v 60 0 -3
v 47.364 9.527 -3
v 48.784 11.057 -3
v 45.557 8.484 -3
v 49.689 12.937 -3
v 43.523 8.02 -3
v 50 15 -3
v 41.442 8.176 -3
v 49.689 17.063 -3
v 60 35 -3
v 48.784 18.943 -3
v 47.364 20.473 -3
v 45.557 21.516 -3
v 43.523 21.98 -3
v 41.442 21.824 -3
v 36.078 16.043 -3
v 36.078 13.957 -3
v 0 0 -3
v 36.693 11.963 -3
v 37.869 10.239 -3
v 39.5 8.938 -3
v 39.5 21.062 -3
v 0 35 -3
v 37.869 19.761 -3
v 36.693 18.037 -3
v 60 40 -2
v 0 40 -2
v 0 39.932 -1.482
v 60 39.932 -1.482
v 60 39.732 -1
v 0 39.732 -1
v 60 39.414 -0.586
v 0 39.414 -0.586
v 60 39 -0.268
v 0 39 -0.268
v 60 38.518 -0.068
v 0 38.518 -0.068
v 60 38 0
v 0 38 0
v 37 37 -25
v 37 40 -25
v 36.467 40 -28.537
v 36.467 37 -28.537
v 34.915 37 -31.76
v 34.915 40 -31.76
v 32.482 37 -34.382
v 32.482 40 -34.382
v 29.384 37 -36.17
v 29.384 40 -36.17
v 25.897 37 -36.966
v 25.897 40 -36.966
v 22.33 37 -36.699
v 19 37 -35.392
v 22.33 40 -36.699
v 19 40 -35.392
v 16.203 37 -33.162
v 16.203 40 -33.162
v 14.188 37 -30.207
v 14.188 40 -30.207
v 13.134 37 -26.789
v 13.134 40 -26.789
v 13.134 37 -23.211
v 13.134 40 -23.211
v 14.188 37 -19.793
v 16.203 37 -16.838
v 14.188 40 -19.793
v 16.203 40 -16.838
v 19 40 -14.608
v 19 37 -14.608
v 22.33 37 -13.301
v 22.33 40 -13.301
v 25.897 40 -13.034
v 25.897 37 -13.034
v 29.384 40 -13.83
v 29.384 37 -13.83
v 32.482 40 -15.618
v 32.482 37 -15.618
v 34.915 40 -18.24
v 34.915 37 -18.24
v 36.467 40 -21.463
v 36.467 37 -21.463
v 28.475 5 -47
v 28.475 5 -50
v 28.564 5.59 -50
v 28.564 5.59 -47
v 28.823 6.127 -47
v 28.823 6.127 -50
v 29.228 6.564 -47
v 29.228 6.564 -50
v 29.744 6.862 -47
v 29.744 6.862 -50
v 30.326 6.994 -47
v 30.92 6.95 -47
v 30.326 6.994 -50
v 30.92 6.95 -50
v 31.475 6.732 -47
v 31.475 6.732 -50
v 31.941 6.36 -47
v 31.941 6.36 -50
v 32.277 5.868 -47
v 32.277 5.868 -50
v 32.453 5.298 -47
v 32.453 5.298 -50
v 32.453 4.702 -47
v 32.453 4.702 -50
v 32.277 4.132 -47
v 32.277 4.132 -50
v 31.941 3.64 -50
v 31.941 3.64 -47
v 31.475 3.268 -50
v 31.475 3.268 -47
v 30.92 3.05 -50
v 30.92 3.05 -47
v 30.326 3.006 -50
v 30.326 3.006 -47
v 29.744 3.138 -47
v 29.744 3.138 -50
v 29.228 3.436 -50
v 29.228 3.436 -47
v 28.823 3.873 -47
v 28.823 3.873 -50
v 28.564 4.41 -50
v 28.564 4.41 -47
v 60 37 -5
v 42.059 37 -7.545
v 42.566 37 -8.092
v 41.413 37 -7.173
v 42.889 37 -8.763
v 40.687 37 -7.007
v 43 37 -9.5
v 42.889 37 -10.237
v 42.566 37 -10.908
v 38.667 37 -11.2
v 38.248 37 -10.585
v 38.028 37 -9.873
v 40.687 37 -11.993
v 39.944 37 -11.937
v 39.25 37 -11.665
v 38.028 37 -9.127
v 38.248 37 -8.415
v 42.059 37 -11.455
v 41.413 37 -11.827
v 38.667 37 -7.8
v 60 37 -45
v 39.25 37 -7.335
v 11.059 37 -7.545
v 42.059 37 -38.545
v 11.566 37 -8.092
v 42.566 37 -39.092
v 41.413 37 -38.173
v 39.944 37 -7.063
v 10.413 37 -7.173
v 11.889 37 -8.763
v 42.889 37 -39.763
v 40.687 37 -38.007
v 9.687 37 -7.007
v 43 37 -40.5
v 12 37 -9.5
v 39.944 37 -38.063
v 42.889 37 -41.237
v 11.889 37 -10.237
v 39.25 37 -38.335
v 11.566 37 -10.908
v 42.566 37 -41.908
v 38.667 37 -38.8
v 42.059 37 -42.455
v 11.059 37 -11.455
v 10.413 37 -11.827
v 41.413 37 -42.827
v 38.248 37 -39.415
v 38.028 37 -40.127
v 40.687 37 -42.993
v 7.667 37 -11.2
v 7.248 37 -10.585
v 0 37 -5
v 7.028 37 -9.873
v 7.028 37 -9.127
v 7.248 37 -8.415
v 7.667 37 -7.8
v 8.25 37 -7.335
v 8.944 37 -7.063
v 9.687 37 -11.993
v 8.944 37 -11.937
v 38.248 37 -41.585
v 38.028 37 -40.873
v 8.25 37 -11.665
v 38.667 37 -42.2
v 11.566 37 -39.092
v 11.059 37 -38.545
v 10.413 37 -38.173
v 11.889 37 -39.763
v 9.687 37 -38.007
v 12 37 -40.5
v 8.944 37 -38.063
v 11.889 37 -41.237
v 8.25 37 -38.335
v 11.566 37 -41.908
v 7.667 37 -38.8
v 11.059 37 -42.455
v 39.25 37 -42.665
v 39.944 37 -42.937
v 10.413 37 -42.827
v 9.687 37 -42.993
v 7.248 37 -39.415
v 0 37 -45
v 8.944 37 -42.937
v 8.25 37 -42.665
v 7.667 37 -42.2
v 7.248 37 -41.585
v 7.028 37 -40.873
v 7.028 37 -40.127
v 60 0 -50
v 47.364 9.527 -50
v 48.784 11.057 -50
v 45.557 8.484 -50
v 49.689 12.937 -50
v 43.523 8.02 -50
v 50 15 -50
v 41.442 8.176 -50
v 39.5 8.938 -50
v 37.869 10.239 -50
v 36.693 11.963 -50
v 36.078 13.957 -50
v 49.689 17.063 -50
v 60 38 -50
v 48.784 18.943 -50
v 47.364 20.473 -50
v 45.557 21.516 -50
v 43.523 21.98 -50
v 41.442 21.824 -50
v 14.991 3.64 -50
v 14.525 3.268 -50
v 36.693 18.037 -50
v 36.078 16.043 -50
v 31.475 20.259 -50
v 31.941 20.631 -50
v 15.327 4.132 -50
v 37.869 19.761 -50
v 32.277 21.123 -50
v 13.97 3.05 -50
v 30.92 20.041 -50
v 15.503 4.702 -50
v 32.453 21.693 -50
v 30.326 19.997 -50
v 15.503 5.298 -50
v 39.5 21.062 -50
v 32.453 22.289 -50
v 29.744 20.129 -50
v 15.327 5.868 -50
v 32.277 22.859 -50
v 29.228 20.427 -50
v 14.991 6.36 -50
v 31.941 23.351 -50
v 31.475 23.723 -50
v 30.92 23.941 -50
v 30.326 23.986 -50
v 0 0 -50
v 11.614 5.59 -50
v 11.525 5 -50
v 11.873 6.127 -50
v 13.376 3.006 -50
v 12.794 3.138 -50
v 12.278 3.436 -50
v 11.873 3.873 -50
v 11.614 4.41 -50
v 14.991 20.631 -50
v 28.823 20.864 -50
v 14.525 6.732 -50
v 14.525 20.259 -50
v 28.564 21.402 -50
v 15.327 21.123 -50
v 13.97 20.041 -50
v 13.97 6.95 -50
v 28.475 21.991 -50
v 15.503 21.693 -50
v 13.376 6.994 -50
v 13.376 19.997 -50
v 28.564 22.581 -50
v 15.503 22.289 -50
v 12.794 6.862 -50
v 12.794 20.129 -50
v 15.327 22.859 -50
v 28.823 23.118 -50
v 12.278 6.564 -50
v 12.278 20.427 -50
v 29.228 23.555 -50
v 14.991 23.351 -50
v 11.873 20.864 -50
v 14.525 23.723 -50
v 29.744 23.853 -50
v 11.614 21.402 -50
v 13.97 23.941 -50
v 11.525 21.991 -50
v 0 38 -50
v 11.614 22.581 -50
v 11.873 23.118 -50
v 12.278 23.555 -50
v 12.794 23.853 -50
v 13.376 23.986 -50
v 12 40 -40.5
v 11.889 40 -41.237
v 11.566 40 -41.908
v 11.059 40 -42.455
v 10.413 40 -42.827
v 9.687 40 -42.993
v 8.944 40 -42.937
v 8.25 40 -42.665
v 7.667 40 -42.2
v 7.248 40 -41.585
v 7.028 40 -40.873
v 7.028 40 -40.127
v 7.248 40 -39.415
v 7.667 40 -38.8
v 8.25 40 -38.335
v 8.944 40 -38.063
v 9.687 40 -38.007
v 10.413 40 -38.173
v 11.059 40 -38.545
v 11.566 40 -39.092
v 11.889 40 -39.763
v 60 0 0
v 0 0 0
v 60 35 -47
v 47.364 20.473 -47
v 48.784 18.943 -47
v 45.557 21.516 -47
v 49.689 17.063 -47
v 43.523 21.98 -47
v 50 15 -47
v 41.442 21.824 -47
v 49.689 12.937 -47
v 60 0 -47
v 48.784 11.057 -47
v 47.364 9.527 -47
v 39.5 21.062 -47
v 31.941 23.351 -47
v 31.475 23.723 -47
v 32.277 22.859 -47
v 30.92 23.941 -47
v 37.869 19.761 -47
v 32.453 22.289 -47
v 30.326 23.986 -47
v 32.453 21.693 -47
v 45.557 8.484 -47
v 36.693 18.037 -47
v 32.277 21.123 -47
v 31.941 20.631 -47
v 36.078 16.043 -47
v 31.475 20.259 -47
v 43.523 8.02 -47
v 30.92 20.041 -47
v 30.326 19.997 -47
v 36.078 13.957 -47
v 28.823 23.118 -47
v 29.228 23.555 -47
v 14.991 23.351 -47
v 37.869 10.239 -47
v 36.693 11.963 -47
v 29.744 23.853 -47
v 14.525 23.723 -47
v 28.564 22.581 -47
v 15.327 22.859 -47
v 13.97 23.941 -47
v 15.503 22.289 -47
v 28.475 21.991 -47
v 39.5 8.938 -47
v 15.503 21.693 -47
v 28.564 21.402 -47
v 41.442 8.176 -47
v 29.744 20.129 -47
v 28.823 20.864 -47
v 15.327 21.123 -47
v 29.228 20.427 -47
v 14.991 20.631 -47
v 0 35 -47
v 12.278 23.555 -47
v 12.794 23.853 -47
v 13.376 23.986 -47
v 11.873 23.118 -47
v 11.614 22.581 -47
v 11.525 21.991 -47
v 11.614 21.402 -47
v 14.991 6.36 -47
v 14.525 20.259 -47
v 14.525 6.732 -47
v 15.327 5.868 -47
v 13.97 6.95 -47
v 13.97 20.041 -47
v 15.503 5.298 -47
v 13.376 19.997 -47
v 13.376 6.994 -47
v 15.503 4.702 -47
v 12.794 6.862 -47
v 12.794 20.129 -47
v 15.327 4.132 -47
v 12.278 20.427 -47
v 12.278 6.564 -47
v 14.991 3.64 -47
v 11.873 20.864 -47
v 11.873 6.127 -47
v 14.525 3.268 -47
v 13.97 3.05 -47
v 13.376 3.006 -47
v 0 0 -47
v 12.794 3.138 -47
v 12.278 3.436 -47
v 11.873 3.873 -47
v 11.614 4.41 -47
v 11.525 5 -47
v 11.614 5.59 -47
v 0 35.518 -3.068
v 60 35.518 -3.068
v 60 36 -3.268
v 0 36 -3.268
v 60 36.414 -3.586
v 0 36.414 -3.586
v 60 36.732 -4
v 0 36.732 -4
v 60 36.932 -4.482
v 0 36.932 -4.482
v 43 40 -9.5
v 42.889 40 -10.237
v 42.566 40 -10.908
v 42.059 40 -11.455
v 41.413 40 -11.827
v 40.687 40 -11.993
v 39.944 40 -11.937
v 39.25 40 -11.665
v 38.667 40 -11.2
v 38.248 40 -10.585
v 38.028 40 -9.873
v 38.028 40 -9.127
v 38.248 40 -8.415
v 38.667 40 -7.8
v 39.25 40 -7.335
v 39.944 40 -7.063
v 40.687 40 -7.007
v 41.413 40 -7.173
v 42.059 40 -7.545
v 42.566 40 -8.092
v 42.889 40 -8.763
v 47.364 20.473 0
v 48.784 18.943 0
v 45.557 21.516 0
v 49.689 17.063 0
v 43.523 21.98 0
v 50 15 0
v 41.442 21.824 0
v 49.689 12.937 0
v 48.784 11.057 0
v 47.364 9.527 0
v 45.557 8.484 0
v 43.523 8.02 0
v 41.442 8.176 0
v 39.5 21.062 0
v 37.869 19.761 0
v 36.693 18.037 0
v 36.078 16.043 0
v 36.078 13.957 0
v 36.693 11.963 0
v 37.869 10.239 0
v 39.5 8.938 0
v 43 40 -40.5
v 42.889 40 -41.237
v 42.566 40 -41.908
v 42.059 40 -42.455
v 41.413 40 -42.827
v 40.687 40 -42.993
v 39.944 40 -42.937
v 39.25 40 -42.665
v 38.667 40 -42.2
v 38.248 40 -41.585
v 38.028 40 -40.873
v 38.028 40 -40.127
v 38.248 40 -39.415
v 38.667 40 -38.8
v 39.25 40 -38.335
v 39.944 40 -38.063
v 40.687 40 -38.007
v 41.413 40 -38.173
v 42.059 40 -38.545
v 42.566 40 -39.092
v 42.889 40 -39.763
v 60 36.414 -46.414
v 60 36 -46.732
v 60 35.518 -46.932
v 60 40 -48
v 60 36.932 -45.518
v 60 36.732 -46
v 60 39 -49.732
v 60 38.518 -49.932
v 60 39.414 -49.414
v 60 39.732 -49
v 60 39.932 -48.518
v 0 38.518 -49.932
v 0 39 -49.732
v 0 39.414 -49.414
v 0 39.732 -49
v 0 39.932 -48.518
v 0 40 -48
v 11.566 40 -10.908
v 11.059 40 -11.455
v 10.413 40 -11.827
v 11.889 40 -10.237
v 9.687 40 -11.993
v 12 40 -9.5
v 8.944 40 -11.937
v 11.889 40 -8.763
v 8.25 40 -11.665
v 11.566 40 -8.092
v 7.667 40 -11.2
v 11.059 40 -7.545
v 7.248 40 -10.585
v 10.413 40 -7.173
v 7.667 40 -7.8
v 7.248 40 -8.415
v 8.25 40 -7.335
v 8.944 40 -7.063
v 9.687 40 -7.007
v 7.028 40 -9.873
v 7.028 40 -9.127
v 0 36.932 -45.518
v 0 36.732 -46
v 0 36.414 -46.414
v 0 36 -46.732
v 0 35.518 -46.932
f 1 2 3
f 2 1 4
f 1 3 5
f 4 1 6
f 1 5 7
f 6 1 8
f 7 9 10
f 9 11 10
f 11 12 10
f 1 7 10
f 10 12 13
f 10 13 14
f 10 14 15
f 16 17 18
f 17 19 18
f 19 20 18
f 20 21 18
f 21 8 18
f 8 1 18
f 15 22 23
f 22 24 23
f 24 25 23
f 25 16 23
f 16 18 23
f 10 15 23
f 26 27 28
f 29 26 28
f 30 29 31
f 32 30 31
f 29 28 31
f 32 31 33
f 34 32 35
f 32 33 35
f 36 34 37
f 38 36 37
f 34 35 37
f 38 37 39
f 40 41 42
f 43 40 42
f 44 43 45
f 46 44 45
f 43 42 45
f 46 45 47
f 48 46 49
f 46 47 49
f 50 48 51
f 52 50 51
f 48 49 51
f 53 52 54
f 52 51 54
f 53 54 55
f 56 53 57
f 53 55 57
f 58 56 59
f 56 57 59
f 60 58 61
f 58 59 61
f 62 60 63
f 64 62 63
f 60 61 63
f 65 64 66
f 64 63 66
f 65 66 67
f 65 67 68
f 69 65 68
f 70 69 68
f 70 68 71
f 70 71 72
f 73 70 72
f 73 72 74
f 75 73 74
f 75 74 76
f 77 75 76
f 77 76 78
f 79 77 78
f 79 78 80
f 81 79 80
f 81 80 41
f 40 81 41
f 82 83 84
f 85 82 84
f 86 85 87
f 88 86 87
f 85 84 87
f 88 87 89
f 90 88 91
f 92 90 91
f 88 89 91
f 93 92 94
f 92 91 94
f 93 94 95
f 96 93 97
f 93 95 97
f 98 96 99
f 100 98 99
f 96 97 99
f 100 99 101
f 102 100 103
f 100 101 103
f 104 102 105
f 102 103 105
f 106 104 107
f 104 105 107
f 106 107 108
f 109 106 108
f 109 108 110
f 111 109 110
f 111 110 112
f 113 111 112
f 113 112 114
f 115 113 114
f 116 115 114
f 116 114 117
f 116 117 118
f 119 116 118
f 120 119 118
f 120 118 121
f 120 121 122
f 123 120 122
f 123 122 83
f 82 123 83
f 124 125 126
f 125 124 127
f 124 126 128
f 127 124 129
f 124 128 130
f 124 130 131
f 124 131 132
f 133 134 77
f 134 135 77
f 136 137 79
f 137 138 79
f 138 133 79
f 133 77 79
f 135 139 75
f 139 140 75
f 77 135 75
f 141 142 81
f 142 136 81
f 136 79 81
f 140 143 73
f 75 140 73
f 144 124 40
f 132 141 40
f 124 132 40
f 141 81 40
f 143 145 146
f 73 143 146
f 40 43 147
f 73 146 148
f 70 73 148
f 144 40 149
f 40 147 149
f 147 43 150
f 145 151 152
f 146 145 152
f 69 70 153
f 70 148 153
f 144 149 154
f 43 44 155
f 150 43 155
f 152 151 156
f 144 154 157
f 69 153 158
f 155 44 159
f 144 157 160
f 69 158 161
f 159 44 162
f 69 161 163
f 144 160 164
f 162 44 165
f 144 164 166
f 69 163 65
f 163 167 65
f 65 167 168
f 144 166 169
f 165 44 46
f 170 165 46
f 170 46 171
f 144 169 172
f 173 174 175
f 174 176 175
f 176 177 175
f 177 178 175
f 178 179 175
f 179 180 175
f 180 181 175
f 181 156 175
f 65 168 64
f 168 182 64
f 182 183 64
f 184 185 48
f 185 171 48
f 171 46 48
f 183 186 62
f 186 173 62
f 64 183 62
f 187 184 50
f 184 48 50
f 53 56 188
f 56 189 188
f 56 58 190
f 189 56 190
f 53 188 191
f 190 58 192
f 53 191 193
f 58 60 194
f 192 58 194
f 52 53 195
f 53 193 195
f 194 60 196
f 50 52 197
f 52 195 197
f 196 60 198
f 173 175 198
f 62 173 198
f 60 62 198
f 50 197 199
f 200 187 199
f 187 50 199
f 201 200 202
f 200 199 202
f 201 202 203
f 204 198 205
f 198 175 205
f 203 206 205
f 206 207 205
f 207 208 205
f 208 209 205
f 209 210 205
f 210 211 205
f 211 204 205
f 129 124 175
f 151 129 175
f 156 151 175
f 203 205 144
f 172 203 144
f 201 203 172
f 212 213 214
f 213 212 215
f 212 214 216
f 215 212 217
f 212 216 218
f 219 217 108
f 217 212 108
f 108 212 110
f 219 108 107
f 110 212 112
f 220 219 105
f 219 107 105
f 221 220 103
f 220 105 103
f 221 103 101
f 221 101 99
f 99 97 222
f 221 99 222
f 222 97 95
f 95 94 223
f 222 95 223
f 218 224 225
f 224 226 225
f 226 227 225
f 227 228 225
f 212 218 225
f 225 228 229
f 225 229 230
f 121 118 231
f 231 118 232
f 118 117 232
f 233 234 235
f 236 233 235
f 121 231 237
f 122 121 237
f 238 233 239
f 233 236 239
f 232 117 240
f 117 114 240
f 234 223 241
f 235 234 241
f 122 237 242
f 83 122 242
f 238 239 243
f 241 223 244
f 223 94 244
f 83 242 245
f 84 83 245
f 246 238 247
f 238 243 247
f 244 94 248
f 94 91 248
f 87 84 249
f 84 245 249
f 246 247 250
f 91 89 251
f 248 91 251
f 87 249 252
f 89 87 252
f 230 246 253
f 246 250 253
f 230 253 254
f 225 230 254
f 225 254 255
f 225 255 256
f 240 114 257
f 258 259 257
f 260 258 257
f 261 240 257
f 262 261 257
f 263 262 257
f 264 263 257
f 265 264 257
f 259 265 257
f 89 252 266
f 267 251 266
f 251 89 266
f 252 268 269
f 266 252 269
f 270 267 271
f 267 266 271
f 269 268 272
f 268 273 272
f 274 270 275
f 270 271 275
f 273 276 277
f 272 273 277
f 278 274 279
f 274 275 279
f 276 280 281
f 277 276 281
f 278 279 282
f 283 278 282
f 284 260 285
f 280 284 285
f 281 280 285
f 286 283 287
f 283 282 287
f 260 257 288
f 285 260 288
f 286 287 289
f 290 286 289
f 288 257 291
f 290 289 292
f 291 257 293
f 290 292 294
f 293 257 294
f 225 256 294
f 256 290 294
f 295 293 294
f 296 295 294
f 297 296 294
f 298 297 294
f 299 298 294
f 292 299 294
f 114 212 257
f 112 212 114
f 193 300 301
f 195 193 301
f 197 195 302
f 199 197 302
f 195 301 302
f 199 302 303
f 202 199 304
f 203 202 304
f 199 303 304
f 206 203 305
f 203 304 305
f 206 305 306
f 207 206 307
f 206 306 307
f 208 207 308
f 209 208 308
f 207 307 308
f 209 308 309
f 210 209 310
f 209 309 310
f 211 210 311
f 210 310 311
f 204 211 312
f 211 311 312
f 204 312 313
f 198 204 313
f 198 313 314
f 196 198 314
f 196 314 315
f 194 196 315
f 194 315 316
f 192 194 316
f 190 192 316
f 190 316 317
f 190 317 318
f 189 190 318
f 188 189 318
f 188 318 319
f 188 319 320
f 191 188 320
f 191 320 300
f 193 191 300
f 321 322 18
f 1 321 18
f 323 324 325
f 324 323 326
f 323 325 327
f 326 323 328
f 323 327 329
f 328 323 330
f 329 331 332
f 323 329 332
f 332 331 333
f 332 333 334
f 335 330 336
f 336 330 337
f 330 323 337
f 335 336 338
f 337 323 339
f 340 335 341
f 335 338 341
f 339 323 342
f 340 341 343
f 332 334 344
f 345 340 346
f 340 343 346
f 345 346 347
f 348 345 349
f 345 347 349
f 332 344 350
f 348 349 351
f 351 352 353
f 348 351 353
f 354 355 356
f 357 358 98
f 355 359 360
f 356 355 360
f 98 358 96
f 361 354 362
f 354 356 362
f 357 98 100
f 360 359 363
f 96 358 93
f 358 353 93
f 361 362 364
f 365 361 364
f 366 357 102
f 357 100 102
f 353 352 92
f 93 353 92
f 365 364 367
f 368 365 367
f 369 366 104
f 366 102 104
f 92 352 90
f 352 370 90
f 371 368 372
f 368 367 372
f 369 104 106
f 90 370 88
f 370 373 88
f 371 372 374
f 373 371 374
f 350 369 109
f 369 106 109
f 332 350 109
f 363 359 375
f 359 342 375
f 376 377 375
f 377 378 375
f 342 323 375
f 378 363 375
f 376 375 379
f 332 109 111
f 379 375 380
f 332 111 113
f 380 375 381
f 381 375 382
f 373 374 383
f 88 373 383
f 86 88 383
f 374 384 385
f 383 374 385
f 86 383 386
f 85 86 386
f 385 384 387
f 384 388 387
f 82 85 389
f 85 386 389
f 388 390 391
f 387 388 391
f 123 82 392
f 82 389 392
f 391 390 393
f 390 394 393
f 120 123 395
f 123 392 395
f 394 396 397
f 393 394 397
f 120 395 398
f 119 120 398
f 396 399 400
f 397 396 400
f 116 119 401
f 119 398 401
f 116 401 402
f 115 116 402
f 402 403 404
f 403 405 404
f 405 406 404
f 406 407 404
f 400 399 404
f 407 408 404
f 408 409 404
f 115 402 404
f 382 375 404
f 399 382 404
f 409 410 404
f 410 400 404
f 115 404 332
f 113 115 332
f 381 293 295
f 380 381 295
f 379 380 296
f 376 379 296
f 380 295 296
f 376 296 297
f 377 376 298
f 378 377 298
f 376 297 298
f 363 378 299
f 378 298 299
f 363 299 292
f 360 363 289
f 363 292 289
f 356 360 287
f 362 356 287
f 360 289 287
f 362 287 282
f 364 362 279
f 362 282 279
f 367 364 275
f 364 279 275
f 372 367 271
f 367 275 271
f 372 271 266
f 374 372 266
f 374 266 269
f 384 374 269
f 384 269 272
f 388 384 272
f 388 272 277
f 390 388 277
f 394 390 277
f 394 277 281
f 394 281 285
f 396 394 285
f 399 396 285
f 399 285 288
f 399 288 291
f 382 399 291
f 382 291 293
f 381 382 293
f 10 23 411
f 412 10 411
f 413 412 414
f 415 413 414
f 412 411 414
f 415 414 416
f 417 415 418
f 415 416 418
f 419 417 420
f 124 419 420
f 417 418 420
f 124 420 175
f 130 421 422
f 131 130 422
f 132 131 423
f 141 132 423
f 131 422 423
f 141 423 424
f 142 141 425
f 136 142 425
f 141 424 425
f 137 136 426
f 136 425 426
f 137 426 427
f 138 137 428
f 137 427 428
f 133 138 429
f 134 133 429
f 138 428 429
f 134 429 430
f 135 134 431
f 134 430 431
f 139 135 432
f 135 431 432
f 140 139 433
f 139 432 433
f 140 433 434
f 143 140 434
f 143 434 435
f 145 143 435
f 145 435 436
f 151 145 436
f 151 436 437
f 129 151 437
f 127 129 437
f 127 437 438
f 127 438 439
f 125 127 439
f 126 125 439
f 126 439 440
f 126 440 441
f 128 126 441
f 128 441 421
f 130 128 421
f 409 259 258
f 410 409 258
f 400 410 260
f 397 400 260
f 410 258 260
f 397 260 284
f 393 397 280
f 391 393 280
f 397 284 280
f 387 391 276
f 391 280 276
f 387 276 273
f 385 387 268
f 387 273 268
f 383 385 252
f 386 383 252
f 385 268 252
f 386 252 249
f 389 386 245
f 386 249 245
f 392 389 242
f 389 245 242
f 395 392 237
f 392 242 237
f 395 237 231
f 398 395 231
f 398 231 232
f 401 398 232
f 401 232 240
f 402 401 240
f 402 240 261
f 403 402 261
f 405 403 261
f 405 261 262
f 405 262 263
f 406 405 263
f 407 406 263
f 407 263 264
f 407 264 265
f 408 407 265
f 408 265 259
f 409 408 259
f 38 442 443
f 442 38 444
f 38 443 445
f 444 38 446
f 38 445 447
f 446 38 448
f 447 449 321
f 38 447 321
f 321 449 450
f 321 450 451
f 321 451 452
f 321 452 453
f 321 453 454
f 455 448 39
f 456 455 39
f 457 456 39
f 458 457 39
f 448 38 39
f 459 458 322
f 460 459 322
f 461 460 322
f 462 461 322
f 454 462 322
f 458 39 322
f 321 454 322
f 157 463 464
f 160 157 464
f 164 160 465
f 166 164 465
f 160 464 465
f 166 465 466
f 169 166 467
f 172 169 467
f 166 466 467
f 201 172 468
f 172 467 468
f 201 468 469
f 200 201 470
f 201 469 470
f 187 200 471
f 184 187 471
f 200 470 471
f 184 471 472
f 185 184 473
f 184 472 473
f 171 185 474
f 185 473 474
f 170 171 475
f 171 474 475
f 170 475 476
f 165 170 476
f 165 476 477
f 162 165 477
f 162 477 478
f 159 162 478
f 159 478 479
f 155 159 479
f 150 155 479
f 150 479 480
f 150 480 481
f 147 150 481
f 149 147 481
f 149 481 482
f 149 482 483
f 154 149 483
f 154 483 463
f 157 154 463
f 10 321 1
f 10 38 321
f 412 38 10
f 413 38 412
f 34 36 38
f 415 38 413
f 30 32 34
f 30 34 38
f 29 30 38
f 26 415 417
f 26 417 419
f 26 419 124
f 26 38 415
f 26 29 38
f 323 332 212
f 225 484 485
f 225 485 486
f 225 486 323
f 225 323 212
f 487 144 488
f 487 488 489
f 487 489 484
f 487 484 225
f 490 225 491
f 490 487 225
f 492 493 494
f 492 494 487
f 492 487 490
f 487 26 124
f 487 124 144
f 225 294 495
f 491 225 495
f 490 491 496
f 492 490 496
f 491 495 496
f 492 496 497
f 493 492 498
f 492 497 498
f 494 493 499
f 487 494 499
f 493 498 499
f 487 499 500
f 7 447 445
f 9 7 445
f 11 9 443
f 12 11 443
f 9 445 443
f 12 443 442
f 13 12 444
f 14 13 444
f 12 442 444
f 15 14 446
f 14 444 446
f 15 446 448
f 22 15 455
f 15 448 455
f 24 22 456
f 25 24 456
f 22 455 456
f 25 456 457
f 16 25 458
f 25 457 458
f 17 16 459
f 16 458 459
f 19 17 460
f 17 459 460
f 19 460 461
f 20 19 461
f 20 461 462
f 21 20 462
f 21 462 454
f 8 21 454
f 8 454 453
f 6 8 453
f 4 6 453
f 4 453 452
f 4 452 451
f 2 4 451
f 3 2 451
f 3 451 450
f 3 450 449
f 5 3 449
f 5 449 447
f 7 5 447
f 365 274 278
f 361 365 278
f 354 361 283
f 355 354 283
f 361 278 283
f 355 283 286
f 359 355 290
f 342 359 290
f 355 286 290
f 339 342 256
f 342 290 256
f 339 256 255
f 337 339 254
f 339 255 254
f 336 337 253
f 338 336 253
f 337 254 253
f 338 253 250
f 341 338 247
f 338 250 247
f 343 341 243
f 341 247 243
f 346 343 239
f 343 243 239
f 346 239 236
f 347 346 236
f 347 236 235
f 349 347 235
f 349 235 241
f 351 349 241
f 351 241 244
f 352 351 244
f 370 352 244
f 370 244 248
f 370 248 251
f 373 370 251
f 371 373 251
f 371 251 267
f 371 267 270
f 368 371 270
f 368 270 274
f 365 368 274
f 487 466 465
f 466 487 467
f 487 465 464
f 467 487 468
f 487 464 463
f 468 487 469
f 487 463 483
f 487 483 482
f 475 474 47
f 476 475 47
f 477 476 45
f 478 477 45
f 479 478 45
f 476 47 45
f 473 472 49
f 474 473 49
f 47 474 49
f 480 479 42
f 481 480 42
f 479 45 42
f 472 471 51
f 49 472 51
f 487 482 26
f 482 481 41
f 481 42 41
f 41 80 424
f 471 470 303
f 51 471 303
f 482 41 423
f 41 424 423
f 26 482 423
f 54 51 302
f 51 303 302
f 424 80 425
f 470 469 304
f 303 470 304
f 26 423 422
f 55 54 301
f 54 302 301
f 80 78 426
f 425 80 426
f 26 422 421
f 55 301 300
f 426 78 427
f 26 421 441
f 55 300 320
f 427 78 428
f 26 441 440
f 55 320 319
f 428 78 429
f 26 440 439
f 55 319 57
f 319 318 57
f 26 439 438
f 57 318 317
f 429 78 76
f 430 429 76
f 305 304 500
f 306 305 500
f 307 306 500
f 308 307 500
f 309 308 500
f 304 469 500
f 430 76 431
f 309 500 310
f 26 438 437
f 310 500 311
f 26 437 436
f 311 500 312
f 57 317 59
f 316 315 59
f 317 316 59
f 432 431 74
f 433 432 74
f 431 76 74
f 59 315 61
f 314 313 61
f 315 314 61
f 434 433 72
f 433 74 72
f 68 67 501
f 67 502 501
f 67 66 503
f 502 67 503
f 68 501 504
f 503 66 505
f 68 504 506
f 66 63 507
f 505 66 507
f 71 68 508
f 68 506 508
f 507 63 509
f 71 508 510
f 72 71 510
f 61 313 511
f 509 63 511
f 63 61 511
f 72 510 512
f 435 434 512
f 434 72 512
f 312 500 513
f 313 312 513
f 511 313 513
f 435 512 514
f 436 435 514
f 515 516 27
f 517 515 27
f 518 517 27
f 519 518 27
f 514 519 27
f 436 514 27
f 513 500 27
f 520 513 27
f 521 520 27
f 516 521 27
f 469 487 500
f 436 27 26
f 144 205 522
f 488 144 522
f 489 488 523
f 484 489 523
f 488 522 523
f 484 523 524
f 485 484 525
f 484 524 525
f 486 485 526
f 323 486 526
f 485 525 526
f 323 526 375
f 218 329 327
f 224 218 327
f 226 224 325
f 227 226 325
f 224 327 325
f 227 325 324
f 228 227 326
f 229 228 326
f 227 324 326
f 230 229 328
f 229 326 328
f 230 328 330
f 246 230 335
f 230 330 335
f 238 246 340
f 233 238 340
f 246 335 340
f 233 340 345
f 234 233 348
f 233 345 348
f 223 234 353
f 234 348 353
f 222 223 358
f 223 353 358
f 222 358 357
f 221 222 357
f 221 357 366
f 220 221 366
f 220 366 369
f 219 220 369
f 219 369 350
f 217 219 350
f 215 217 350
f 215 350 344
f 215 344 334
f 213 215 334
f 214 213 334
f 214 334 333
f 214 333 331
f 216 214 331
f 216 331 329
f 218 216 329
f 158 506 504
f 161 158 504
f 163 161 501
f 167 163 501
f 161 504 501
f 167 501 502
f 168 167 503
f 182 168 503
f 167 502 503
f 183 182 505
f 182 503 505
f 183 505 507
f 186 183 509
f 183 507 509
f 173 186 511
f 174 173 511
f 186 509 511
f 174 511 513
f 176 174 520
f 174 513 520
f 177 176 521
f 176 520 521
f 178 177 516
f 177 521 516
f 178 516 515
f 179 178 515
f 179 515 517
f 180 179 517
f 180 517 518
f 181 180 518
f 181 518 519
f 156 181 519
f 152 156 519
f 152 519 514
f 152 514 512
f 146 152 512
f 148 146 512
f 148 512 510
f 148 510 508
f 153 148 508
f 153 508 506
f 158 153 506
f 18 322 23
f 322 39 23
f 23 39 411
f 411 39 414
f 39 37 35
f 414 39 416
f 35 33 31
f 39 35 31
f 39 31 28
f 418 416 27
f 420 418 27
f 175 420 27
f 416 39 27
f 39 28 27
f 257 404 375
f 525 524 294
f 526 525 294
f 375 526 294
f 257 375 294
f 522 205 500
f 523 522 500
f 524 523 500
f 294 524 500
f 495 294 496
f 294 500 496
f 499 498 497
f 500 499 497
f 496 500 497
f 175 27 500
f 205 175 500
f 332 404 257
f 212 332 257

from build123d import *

# Parameters (mm, degrees)
EXTRUDE_1_DEPTH     = 60
CUT_EXTRUDE_1_REACH = 42
SKETCH_2_R          = 2.5
SKETCH_2_R_2        = 12
SKETCH_3_R          = 7
CUT_EXTRUDE_2_DEPTH = 51
CUT_EXTRUDE_3_REACH = 52
SKETCH_6_R          = 2


with BuildPart() as part:
    # 草图1 → 凸台-拉伸1 (new body)
    with BuildSketch(Plane(origin=(0, 0, 0), x_dir=(0, 0, -1), z_dir=(1, 0, 0))):
        with BuildLine():
            Line((0, 0), (3, 0))
            Line((3, 0), (3, 35))
            ThreePointArc((3, 35), (3.585786438, 36.414213562), (5, 37))
            Line((5, 37), (45, 37))
            ThreePointArc((45, 37), (46.414213562, 36.414213562), (47, 35))
            Line((47, 35), (47, 0))
            Line((47, 0), (50, 0))
            Line((50, 0), (50, 38))
            ThreePointArc((50, 38), (49.414213562, 39.414213562), (48, 40))
            Line((48, 40), (2, 40))
            ThreePointArc((2, 40), (0.585786438, 39.414213562), (0, 38))
            Line((0, 38), (0, 0))
        make_face()
    extrude(amount=EXTRUDE_1_DEPTH)

    # 草图2 → 切除-拉伸1 (cut, up to next)
    with BuildSketch(Plane(origin=(0, 40, 0), x_dir=(1, 0, 0), z_dir=(0, 1, 0)), mode=Mode.PRIVATE) as cut_extrude_1_sk1:
        with Locations((9.5, 9.5)):
            Circle(SKETCH_2_R)
    cut_extrude_1_tool1 = extrude(cut_extrude_1_sk1.sketch, amount=-CUT_EXTRUDE_1_REACH, mode=Mode.PRIVATE) & part.part
    add(cut_extrude_1_tool1.solids().sort_by_distance((9.5, 40, -9.5))[0], mode=Mode.SUBTRACT)
    # 草图2 → 切除-拉伸1 (cut, up to next)
    with BuildSketch(Plane(origin=(0, 40, 0), x_dir=(1, 0, 0), z_dir=(0, 1, 0)), mode=Mode.PRIVATE) as cut_extrude_1_sk2:
        with Locations((40.5, 9.5)):
            Circle(SKETCH_2_R)
    cut_extrude_1_tool2 = extrude(cut_extrude_1_sk2.sketch, amount=-CUT_EXTRUDE_1_REACH, mode=Mode.PRIVATE) & part.part
    add(cut_extrude_1_tool2.solids().sort_by_distance((40.5, 40, -9.5))[0], mode=Mode.SUBTRACT)
    # 草图2 → 切除-拉伸1 (cut, up to next)
    with BuildSketch(Plane(origin=(0, 40, 0), x_dir=(1, 0, 0), z_dir=(0, 1, 0)), mode=Mode.PRIVATE) as cut_extrude_1_sk3:
        with Locations((40.5, 40.5)):
            Circle(SKETCH_2_R)
    cut_extrude_1_tool3 = extrude(cut_extrude_1_sk3.sketch, amount=-CUT_EXTRUDE_1_REACH, mode=Mode.PRIVATE) & part.part
    add(cut_extrude_1_tool3.solids().sort_by_distance((40.5, 40, -40.5))[0], mode=Mode.SUBTRACT)
    # 草图2 → 切除-拉伸1 (cut, up to next)
    with BuildSketch(Plane(origin=(0, 40, 0), x_dir=(1, 0, 0), z_dir=(0, 1, 0)), mode=Mode.PRIVATE) as cut_extrude_1_sk4:
        with Locations((9.5, 40.5)):
            Circle(SKETCH_2_R)
    cut_extrude_1_tool4 = extrude(cut_extrude_1_sk4.sketch, amount=-CUT_EXTRUDE_1_REACH, mode=Mode.PRIVATE) & part.part
    add(cut_extrude_1_tool4.solids().sort_by_distance((9.5, 40, -40.5))[0], mode=Mode.SUBTRACT)
    # 草图2 → 切除-拉伸1 (cut, up to next)
    with BuildSketch(Plane(origin=(0, 40, 0), x_dir=(1, 0, 0), z_dir=(0, 1, 0)), mode=Mode.PRIVATE) as cut_extrude_1_sk5:
        with Locations((25, 25)):
            Circle(SKETCH_2_R_2)
    cut_extrude_1_tool5 = extrude(cut_extrude_1_sk5.sketch, amount=-CUT_EXTRUDE_1_REACH, mode=Mode.PRIVATE) & part.part
    add(cut_extrude_1_tool5.solids().sort_by_distance((25, 40, -25))[0], mode=Mode.SUBTRACT)

    # 草图3 → 切除-拉伸2 (cut, through all)
    with BuildSketch(Plane.XY):
        with Locations((43, 15)):
            Circle(SKETCH_3_R)
    extrude(amount=-CUT_EXTRUDE_2_DEPTH, mode=Mode.SUBTRACT)

    # 草图6 → 切除-拉伸3 (cut, up to next)
    with BuildSketch(Plane(origin=(0, 0, -50), x_dir=(-1, 0, 0), z_dir=(0, 0, -1)), mode=Mode.PRIVATE) as cut_extrude_3_sk1:
        with Locations((-13.525, 5)):
            Circle(SKETCH_6_R)
    cut_extrude_3_tool1 = extrude(cut_extrude_3_sk1.sketch, amount=-CUT_EXTRUDE_3_REACH, mode=Mode.PRIVATE) & part.part
    add(cut_extrude_3_tool1.solids().sort_by_distance((13.525, 5, -50))[0], mode=Mode.SUBTRACT)
    # 草图6 → 切除-拉伸3 (cut, up to next)
    with BuildSketch(Plane(origin=(0, 0, -50), x_dir=(-1, 0, 0), z_dir=(0, 0, -1)), mode=Mode.PRIVATE) as cut_extrude_3_sk2:
        with Locations((-30.475, 5)):
            Circle(SKETCH_6_R)
    cut_extrude_3_tool2 = extrude(cut_extrude_3_sk2.sketch, amount=-CUT_EXTRUDE_3_REACH, mode=Mode.PRIVATE) & part.part
    add(cut_extrude_3_tool2.solids().sort_by_distance((30.475, 5, -50))[0], mode=Mode.SUBTRACT)
    # 草图6 → 切除-拉伸3 (cut, up to next)
    with BuildSketch(Plane(origin=(0, 0, -50), x_dir=(-1, 0, 0), z_dir=(0, 0, -1)), mode=Mode.PRIVATE) as cut_extrude_3_sk3:
        with Locations((-30.475, 21.991100612)):
            Circle(SKETCH_6_R)
    cut_extrude_3_tool3 = extrude(cut_extrude_3_sk3.sketch, amount=-CUT_EXTRUDE_3_REACH, mode=Mode.PRIVATE) & part.part
    add(cut_extrude_3_tool3.solids().sort_by_distance((30.475, 21.991101, -50))[0], mode=Mode.SUBTRACT)
    # 草图6 → 切除-拉伸3 (cut, up to next)
    with BuildSketch(Plane(origin=(0, 0, -50), x_dir=(-1, 0, 0), z_dir=(0, 0, -1)), mode=Mode.PRIVATE) as cut_extrude_3_sk4:
        with Locations((-13.525, 21.991100612)):
            Circle(SKETCH_6_R)
    cut_extrude_3_tool4 = extrude(cut_extrude_3_sk4.sketch, amount=-CUT_EXTRUDE_3_REACH, mode=Mode.PRIVATE) & part.part
    add(cut_extrude_3_tool4.solids().sort_by_distance((13.525, 21.991101, -50))[0], mode=Mode.SUBTRACT)


solid = part.part
